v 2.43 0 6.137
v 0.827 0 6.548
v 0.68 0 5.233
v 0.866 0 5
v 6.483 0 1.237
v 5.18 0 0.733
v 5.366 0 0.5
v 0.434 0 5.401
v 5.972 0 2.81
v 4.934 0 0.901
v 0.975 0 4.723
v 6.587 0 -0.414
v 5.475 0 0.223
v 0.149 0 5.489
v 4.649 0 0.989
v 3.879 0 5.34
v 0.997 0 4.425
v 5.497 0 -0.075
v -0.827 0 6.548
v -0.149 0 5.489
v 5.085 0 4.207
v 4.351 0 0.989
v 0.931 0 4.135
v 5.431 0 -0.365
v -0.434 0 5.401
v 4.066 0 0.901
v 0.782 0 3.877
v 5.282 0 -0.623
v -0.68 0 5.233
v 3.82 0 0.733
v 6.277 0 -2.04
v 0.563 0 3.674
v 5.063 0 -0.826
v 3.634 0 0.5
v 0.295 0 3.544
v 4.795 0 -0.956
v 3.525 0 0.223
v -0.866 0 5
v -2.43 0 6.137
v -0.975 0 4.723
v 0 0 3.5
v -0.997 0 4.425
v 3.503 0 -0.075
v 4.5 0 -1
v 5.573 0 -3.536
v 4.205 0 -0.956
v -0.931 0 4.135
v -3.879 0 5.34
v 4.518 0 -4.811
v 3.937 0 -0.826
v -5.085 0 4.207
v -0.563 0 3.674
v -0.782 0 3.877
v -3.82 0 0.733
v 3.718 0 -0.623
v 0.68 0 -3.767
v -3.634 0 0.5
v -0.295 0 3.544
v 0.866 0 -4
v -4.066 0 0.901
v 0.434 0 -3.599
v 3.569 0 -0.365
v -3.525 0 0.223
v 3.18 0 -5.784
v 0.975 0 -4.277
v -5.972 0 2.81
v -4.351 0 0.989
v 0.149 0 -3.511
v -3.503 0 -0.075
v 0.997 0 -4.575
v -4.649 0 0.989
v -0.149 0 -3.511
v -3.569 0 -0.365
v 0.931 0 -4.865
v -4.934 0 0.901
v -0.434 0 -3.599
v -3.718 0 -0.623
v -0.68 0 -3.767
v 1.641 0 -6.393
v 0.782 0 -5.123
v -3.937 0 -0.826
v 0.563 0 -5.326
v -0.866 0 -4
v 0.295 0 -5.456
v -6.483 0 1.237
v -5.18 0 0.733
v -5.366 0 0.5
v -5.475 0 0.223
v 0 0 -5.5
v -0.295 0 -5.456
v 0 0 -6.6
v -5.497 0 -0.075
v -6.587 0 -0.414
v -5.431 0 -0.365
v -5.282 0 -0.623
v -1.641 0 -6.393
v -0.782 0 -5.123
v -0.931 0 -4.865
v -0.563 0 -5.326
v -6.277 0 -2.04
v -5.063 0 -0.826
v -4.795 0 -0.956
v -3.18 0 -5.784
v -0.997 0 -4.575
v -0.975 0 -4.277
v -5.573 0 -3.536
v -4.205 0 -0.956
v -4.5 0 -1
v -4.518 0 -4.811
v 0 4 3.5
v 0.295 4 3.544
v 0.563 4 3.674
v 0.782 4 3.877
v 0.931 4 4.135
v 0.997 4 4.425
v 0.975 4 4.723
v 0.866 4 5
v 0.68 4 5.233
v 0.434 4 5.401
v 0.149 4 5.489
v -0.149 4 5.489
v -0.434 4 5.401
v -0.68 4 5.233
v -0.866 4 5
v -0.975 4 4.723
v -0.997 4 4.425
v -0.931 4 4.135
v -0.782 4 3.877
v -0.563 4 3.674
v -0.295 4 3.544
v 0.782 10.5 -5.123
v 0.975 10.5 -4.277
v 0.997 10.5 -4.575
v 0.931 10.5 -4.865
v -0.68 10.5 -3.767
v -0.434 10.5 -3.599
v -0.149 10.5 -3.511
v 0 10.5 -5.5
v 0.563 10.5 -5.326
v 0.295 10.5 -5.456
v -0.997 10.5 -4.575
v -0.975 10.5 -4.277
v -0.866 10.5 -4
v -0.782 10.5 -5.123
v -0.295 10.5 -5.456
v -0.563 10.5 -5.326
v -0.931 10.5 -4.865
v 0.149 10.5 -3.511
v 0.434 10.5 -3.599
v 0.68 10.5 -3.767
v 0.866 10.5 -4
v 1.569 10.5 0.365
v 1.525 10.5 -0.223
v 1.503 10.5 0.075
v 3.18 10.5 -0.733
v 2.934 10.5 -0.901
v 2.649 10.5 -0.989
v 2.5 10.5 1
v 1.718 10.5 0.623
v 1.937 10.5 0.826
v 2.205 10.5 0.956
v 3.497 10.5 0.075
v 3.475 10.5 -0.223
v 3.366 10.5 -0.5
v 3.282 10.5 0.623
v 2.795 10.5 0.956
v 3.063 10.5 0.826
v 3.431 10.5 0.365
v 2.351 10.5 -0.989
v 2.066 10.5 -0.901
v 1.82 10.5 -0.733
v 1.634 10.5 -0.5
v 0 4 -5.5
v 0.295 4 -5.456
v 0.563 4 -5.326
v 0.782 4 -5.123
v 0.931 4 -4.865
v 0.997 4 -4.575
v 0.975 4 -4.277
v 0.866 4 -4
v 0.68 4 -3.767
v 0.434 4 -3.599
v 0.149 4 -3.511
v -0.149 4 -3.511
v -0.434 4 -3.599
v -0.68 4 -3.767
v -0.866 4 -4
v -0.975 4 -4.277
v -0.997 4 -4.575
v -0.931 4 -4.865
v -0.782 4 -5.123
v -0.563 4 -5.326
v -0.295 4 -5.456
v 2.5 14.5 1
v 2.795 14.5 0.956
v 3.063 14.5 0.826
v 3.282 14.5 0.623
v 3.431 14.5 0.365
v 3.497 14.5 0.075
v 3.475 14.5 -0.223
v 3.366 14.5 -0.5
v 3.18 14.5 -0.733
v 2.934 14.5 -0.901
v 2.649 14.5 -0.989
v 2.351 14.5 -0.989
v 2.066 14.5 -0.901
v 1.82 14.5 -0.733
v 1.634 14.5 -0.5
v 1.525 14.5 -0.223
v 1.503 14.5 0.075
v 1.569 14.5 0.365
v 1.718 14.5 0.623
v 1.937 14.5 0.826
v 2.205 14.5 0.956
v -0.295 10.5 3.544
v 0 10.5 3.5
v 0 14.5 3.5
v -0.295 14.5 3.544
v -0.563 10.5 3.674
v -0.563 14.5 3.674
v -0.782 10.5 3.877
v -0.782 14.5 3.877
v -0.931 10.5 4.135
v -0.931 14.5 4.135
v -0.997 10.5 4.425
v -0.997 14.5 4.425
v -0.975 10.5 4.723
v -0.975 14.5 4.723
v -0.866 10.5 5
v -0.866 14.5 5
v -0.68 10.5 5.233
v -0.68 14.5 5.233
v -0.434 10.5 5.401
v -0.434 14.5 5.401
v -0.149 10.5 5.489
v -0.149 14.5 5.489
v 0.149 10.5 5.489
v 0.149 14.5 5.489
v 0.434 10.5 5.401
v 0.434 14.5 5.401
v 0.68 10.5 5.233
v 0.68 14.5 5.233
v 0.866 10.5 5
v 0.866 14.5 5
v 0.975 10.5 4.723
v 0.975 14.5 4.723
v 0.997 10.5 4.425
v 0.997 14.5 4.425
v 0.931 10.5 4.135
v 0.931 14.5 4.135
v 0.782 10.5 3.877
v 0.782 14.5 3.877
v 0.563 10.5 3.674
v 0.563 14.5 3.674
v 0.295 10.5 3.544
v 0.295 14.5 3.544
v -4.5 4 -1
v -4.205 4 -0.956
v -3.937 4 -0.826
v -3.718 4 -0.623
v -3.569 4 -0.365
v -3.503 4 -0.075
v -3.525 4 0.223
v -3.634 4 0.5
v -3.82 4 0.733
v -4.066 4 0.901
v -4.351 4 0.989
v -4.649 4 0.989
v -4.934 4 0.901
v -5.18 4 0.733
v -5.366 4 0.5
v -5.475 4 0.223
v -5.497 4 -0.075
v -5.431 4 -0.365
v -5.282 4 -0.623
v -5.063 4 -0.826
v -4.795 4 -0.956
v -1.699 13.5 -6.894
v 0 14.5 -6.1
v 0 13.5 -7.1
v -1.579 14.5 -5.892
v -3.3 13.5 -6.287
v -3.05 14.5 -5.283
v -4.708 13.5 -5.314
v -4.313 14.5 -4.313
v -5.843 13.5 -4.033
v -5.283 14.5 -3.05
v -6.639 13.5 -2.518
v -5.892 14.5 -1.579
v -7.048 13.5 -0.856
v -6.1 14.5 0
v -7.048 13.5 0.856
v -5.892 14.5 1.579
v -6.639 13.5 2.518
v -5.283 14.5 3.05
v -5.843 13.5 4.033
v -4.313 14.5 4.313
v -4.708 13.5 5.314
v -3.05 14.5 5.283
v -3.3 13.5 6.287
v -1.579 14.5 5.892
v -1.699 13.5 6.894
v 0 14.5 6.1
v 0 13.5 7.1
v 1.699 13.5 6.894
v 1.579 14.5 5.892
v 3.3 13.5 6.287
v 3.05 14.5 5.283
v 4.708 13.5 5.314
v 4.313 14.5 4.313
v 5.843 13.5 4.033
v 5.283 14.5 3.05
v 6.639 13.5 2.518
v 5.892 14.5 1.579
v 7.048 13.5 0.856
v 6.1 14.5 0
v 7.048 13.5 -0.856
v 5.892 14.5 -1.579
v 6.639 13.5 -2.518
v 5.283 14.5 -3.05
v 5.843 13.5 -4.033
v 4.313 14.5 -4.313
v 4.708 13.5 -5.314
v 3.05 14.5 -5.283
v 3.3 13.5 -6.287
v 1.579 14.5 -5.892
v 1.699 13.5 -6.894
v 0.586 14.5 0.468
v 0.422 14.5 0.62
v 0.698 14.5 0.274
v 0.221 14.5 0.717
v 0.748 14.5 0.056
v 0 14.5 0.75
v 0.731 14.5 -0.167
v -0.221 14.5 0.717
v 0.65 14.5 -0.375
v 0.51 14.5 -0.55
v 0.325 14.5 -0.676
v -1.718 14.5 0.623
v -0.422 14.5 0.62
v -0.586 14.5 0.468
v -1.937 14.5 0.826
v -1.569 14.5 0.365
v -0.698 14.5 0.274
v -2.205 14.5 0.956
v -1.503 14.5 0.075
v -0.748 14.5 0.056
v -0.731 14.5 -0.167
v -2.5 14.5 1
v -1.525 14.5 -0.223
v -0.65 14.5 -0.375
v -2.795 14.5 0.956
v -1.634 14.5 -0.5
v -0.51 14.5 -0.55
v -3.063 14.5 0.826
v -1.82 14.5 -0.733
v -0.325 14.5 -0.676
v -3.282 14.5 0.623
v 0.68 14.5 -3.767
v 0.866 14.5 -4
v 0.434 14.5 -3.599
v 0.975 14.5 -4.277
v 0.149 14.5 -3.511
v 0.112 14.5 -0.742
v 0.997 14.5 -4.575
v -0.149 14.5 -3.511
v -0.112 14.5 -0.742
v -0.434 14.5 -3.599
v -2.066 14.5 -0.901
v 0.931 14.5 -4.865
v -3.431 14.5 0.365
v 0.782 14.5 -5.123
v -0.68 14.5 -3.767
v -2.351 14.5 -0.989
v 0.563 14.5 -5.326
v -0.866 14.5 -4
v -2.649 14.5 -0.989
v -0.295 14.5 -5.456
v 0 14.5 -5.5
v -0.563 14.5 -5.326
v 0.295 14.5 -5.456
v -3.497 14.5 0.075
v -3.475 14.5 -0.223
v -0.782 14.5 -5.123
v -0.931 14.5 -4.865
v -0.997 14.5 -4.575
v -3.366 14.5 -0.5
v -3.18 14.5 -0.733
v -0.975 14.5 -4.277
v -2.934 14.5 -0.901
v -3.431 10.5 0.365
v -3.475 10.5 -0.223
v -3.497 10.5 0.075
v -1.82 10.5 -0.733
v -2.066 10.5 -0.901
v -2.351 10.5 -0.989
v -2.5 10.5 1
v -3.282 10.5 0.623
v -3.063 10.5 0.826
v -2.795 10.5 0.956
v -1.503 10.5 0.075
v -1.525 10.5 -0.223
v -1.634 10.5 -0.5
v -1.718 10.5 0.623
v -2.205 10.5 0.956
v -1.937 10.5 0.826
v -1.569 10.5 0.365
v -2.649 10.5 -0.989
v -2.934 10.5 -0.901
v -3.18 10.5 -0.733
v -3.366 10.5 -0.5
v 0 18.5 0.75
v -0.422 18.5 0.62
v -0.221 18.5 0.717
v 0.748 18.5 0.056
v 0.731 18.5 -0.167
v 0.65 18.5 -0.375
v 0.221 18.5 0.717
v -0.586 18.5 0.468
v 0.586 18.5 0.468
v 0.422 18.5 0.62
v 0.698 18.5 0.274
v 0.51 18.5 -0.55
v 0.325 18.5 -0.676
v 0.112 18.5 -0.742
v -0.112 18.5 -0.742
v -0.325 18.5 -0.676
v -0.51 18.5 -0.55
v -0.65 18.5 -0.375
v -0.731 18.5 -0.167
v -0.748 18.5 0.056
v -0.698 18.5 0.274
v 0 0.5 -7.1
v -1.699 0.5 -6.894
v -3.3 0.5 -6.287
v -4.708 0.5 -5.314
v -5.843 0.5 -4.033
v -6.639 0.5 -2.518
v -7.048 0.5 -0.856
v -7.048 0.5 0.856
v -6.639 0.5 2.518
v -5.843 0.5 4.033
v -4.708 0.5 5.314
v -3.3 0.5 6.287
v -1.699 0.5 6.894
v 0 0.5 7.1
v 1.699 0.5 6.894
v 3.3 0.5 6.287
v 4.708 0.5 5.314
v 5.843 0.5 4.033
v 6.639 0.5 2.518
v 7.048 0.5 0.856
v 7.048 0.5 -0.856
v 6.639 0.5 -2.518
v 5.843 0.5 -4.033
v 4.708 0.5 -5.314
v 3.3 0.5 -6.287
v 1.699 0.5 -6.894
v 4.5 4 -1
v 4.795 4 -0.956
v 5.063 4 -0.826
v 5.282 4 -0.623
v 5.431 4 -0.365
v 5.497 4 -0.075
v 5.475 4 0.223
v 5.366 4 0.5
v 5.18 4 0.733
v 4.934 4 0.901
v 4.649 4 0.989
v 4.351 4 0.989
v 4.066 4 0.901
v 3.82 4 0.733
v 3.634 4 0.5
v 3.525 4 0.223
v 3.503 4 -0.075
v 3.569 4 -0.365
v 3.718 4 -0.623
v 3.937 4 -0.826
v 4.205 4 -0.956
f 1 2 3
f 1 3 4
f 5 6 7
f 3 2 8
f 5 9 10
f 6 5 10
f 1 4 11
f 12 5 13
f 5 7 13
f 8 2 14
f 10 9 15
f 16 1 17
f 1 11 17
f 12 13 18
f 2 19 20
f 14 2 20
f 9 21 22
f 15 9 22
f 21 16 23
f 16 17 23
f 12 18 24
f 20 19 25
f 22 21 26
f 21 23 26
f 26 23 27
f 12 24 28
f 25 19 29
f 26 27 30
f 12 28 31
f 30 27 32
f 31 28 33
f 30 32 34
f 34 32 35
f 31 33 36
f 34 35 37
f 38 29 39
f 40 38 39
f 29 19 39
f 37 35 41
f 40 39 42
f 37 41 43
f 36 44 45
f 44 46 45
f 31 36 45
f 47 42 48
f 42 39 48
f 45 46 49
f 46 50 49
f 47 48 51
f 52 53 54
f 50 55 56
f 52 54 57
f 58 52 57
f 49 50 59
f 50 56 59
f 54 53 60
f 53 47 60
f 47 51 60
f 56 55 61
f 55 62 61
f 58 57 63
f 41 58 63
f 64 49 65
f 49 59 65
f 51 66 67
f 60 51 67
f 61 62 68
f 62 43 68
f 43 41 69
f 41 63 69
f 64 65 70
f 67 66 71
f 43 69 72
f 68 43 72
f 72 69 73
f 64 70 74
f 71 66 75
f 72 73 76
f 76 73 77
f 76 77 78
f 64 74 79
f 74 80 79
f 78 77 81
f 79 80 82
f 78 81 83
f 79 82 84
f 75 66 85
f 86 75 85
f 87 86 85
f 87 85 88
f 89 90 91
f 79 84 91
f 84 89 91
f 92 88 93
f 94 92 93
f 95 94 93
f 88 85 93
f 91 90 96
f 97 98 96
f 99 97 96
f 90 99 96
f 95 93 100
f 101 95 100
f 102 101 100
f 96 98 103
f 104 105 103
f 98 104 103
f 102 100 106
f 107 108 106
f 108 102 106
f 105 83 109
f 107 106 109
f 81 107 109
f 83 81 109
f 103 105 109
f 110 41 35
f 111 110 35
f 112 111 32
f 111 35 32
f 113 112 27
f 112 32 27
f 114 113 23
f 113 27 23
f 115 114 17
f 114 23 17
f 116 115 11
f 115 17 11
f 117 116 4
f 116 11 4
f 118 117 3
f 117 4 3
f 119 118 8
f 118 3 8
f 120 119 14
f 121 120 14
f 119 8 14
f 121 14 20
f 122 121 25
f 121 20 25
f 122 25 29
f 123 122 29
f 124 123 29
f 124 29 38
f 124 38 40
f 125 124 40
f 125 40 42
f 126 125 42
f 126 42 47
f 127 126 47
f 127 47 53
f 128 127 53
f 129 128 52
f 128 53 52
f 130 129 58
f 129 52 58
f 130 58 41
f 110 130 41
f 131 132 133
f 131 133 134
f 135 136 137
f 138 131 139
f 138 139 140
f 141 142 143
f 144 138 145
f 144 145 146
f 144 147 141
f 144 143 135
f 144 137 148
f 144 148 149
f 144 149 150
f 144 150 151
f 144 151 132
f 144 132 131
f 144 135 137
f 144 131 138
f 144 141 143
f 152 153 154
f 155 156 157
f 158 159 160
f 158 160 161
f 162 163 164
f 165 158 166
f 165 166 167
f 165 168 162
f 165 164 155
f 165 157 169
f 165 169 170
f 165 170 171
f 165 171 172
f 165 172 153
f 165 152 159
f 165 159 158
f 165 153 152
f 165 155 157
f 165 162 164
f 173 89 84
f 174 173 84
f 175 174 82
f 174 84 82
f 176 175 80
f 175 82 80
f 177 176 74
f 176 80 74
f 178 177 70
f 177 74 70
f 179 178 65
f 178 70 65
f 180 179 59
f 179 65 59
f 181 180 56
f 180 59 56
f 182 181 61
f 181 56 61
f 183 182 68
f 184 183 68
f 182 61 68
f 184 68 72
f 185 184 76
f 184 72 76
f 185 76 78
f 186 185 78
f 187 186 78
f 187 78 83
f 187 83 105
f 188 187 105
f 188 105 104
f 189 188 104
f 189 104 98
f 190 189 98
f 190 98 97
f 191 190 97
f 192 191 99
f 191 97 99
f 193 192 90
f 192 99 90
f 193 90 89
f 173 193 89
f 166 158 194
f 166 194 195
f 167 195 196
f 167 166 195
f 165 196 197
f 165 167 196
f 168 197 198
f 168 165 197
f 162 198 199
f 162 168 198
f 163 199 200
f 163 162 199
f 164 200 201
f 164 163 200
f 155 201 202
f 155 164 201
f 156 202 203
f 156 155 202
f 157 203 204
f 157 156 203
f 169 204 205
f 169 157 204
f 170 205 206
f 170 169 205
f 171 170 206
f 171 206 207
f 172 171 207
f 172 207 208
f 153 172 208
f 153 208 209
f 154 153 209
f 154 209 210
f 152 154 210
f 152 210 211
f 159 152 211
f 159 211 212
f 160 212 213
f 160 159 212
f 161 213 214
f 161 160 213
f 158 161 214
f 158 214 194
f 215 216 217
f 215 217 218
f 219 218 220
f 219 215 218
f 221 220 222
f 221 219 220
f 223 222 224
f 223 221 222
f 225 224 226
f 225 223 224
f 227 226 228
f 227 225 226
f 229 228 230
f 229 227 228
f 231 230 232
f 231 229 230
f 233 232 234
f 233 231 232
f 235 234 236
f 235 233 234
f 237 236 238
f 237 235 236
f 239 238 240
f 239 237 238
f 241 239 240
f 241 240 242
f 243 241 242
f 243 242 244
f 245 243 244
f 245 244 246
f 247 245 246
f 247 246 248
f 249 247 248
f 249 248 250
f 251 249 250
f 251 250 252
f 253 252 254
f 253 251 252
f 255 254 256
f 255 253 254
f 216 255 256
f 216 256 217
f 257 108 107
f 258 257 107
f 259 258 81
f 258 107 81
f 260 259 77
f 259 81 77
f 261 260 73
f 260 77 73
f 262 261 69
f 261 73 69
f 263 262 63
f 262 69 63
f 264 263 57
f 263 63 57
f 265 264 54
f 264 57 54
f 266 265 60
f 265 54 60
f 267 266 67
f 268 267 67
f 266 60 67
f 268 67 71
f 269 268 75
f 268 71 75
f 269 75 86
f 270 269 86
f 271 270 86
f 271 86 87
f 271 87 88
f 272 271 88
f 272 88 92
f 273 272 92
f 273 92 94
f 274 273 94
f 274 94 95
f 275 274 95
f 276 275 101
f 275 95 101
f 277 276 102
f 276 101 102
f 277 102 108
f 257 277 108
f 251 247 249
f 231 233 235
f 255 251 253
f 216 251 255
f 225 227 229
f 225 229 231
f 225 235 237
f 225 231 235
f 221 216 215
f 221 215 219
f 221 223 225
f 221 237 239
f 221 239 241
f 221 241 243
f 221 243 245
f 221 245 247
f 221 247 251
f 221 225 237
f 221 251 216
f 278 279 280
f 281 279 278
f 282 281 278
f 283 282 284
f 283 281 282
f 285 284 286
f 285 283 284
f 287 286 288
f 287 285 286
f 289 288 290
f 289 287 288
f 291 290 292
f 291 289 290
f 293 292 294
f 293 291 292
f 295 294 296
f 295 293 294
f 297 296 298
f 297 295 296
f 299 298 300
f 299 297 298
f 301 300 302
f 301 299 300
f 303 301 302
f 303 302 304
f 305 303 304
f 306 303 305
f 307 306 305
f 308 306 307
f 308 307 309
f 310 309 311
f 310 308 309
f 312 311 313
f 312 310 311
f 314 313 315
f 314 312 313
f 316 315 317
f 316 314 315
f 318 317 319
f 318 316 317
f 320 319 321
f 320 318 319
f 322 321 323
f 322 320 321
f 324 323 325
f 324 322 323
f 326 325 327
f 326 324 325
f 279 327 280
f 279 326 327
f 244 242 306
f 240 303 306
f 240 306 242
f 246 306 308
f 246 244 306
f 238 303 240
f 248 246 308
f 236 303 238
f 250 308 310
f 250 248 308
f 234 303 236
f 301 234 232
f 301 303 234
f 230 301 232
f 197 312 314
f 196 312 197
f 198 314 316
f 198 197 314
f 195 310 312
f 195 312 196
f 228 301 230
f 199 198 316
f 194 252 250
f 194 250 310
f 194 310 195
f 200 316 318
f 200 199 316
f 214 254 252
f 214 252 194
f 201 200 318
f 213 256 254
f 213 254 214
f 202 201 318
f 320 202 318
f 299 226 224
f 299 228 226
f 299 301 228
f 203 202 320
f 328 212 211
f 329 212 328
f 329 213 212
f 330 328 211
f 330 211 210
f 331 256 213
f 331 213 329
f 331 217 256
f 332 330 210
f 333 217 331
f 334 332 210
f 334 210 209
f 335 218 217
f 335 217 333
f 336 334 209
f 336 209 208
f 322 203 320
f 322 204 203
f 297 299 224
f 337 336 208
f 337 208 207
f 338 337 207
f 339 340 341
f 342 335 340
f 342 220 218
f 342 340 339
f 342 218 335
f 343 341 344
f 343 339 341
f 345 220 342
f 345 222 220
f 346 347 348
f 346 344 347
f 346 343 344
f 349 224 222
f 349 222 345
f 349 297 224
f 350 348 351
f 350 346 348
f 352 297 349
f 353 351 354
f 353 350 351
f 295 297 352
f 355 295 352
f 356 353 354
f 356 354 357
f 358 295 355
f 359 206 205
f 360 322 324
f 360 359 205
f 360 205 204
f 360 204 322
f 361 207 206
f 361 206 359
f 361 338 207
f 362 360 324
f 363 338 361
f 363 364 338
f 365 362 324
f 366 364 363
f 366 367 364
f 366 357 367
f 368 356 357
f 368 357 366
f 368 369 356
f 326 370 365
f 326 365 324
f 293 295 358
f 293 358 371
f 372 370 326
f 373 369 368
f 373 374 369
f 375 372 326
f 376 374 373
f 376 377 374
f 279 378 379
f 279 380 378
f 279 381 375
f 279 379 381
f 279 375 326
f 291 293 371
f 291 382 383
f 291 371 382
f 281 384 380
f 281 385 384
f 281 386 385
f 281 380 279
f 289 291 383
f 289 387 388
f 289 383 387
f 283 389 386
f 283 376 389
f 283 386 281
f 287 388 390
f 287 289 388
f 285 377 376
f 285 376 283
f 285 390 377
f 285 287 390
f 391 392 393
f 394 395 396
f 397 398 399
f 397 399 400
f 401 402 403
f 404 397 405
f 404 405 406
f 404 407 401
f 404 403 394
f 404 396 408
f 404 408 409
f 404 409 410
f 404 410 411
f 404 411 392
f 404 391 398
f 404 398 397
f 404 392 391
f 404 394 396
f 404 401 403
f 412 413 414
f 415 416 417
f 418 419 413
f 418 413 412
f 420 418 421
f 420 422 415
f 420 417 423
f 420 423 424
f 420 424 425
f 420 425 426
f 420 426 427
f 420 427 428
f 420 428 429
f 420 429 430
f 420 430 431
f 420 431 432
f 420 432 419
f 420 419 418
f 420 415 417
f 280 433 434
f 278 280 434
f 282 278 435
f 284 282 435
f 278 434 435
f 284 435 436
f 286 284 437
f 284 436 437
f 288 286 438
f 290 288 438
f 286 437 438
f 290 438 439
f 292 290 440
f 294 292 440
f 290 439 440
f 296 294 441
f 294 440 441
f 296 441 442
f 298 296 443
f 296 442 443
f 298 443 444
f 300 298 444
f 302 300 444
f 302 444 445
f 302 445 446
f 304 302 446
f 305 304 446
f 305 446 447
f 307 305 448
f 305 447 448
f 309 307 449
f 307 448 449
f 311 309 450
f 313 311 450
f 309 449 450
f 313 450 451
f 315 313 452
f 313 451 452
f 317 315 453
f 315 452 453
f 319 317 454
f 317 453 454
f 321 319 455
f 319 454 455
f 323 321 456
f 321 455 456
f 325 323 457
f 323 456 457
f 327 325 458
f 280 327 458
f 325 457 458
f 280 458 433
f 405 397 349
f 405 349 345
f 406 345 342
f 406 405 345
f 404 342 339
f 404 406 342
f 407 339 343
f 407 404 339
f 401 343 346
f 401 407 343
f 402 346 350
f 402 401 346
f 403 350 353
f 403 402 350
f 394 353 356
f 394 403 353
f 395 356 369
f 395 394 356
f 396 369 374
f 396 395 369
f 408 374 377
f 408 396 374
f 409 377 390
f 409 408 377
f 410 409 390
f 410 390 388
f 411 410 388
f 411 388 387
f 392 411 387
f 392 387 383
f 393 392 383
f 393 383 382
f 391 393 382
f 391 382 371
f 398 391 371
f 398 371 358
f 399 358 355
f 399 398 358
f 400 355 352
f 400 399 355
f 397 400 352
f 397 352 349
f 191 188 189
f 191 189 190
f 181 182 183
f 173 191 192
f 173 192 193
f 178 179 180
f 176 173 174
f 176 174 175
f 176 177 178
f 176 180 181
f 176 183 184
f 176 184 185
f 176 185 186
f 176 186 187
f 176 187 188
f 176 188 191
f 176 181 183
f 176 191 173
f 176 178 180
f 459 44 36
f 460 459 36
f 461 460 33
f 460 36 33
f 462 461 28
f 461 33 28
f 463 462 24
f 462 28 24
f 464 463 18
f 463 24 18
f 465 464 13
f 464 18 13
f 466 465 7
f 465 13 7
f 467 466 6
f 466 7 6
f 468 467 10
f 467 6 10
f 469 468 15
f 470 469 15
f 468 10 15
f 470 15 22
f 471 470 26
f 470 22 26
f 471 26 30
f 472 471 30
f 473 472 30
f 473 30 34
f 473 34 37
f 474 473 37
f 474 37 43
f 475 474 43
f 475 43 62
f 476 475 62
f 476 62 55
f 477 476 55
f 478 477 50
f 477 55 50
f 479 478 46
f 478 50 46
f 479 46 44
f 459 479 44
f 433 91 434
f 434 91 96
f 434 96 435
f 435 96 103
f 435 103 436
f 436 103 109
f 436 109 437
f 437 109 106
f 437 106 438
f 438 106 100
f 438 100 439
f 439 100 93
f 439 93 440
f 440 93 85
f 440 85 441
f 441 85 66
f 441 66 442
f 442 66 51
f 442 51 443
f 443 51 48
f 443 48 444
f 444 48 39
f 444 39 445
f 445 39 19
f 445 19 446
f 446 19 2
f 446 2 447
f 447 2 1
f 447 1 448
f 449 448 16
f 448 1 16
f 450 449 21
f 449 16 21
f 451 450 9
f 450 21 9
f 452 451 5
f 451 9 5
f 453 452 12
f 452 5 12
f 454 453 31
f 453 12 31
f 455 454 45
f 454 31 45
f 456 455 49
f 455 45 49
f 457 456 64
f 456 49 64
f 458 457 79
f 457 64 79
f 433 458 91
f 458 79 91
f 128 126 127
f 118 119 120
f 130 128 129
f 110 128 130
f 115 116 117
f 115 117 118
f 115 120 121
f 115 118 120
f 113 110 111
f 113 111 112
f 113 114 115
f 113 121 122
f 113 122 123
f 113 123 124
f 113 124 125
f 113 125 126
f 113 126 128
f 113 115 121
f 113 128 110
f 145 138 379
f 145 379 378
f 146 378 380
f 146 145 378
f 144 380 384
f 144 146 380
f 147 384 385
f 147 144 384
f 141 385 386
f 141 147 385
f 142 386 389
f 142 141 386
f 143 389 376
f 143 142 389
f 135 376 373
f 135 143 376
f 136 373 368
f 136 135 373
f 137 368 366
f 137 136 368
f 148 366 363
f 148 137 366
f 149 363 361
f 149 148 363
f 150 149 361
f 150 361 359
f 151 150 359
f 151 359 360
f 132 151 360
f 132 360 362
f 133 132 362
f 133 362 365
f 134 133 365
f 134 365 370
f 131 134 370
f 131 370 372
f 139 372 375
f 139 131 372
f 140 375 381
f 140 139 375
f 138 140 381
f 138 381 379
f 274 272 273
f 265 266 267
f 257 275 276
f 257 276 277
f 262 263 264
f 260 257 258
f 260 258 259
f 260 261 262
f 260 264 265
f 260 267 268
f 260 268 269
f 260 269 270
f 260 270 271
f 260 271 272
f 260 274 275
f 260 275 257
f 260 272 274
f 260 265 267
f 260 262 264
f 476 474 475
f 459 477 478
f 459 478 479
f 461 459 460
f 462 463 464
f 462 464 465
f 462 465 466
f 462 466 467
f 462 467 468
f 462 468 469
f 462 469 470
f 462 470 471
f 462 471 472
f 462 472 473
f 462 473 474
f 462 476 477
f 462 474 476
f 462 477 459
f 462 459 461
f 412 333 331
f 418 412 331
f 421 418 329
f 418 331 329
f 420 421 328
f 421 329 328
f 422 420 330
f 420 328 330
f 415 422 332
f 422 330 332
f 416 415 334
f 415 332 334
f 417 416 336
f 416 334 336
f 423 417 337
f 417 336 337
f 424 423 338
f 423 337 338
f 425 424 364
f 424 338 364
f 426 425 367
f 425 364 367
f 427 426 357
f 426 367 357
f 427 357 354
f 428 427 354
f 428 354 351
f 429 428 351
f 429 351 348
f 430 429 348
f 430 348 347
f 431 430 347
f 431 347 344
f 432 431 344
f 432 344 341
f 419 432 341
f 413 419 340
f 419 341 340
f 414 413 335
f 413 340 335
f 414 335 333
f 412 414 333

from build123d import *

# Parameters (mm, degrees)
SKETCH1_R           = 7.1
BOSS_EXTRUDE1_DEPTH = 14.5
SKETCH2_R           = 0.75
BOSS_EXTRUDE2_DEPTH = 4
SKETCH3_R           = 1
CUT_EXTRUDE1_DEPTH  = 4
CUT_EXTRUDE2_START  = -4
SKETCH4_R           = 1
CUT_EXTRUDE2_DEPTH  = 4
CHAMFER1_SIZE       = 1
CHAMFER2_SIZE       = 0.5


with BuildPart() as part:
    # Sketch1 → Boss-Extrude1 (new body)
    with BuildSketch(Plane(origin=(0, 0, 0), x_dir=(1, 0, 0), z_dir=(0, 1, 0))):
        with Locations(Location((0, 0, 0), (0, 0, 90))):
            Circle(SKETCH1_R)
    extrude(amount=BOSS_EXTRUDE1_DEPTH)

    # Sketch2 → Boss-Extrude2 (add)
    with BuildSketch(Plane(origin=(0, 14.5, 0), x_dir=(1, 0, 0), z_dir=(0, 1, 0))):
        with Locations(Location((0, 0, 0), (0, 0, 270))):
            Circle(SKETCH2_R)
    extrude(amount=BOSS_EXTRUDE2_DEPTH)

    # Sketch3 → Cut-Extrude1 (cut)
    with BuildSketch(Plane.XZ):
        with Locations(Location((-4.5, 0, 0), (0, 0, 270))):
            Circle(SKETCH3_R)
        with Locations(Location((0, 4.5, 0), (0, 0, 270))):
            Circle(SKETCH3_R)
        with Locations(Location((0, -4.5, 0), (0, 0, 270))):
            Circle(SKETCH3_R)
        with Locations(Location((4.5, 0, 0), (0, 0, 270))):
            Circle(SKETCH3_R)
    extrude(amount=-CUT_EXTRUDE1_DEPTH, mode=Mode.SUBTRACT)

    # Sketch4 → Cut-Extrude2 (cut)
    with BuildSketch(Plane(origin=(0, 14.5, 0), x_dir=(1, 0, 0), z_dir=(0, 1, 0)).offset(CUT_EXTRUDE2_START)):
        with Locations(Location((-2.5, 0, 0), (0, 0, 270))):
            Circle(SKETCH4_R)
        with Locations(Location((0, 4.5, 0), (0, 0, 90))):
            Circle(SKETCH4_R)
        with Locations(Location((0, -4.5, 0), (0, 0, 90))):
            Circle(SKETCH4_R)
        with Locations(Location((2.5, 0, 0), (0, 0, 270))):
            Circle(SKETCH4_R)
    extrude(amount=CUT_EXTRUDE2_DEPTH, mode=Mode.SUBTRACT)

    # Chamfer1
    chamfer1_edges = [part.edges().sort_by_distance(p)[0] for p in [
        (0, 14.5, 7.1),
    ]]
    chamfer(chamfer1_edges, length=CHAMFER1_SIZE)

    # Chamfer2
    chamfer2_edges = [part.edges().sort_by_distance(p)[0] for p in [
        (0, 0, 7.1),
    ]]
    chamfer(chamfer2_edges, length=CHAMFER2_SIZE)


solid = part.part
